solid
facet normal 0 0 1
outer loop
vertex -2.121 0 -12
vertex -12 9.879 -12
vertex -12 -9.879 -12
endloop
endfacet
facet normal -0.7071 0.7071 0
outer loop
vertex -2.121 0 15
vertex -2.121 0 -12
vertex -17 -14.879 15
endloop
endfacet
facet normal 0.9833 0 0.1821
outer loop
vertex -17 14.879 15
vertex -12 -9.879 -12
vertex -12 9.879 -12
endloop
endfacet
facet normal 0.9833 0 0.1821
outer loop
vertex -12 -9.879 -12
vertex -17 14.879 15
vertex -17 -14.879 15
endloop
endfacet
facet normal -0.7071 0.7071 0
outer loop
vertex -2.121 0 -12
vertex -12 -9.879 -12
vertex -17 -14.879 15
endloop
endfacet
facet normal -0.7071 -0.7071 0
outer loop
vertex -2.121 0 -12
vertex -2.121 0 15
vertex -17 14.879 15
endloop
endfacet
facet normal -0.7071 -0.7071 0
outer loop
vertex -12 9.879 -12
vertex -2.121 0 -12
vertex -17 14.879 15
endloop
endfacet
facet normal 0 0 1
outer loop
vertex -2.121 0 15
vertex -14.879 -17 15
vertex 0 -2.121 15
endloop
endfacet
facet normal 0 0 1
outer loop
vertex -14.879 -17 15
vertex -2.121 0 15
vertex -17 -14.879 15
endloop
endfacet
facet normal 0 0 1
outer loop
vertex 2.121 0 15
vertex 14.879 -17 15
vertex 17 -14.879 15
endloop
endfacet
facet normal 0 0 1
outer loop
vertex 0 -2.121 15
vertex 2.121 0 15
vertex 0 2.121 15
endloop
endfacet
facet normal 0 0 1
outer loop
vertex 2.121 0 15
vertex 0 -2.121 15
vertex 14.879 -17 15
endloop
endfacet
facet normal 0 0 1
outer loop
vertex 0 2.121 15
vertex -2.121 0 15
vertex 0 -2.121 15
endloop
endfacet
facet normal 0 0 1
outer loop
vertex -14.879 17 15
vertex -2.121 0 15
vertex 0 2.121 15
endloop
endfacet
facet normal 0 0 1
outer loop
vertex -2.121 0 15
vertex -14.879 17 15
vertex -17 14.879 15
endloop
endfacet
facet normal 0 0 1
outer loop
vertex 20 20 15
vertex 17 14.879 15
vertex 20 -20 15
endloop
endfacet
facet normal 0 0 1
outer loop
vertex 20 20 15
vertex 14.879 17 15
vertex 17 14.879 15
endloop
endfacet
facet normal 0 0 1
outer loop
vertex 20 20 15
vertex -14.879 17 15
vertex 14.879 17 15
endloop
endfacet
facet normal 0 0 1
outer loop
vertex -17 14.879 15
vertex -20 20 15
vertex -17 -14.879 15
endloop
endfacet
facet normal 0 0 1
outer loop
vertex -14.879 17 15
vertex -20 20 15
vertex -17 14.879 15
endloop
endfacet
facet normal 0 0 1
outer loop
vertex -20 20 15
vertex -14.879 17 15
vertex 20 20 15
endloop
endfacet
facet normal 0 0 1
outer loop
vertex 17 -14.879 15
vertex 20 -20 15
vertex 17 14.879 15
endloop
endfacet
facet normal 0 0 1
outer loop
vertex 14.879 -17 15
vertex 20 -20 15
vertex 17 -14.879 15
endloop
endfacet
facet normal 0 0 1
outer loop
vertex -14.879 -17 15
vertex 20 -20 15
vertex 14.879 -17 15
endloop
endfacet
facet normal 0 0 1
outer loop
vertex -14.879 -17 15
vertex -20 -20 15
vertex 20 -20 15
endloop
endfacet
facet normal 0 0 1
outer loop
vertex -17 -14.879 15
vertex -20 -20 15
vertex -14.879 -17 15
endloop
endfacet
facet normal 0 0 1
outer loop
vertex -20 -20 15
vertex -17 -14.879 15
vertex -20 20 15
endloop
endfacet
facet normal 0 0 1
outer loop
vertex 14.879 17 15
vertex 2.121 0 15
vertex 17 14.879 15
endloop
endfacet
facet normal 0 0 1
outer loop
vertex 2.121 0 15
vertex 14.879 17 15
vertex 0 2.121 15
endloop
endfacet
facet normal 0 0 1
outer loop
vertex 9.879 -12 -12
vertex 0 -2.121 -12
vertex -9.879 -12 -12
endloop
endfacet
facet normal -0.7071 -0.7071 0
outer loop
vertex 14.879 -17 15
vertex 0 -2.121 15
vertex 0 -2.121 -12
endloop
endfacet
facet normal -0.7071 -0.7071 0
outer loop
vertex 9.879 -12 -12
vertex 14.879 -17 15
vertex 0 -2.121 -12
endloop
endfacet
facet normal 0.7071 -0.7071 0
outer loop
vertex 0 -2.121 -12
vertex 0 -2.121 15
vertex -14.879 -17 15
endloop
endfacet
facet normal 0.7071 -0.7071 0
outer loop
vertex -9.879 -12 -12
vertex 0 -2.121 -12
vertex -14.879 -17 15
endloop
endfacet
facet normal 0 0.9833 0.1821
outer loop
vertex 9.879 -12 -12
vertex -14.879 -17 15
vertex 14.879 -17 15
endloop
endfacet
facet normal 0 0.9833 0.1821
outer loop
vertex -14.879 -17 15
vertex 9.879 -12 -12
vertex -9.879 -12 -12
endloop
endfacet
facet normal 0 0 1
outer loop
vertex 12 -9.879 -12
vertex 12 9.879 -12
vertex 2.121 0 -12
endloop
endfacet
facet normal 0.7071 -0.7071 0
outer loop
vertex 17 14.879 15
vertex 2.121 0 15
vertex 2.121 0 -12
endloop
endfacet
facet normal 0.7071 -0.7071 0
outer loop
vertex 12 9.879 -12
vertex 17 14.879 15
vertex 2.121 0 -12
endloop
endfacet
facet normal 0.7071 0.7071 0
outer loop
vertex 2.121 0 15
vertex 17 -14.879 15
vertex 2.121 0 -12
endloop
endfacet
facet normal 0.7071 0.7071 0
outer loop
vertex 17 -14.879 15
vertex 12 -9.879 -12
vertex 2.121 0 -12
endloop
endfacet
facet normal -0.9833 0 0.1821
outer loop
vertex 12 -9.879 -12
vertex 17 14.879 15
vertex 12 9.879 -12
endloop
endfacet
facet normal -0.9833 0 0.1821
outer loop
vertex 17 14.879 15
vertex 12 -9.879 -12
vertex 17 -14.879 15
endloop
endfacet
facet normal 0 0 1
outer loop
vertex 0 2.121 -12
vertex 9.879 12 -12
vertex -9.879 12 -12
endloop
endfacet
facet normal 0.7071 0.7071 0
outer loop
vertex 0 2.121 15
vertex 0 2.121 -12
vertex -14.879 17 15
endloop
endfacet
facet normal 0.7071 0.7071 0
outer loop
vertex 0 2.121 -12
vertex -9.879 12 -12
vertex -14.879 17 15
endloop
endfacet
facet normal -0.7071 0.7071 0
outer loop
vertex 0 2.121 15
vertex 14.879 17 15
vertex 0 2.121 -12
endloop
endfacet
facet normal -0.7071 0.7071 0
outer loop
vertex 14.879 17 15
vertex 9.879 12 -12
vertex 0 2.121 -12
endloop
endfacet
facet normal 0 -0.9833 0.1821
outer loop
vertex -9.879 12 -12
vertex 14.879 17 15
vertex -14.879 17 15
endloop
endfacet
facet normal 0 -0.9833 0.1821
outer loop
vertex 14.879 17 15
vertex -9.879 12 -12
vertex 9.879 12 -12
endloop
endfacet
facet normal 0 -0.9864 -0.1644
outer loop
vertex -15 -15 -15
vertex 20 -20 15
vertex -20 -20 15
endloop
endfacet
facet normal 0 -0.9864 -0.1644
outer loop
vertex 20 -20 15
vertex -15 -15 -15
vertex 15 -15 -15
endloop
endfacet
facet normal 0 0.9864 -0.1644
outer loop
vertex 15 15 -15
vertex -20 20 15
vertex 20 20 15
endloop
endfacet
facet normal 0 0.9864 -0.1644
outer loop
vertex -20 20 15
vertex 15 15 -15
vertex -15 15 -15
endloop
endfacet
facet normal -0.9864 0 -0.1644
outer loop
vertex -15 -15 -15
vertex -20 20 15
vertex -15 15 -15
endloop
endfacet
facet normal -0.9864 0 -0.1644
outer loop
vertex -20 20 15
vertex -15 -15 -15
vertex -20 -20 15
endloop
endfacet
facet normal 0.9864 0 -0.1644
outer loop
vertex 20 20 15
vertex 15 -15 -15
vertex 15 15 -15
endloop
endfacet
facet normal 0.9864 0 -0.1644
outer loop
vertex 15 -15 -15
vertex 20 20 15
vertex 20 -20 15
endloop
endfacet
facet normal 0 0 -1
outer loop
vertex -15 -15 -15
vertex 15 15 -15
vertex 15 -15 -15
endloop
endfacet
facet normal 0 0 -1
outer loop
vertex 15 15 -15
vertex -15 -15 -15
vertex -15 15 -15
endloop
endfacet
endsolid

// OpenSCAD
//heighth
heighth=30;
//width at bottom
length_bottom=15;
//width at top
length_top=20;
//wall strength
wall=3;

hh=heighth/2;
dia = wall * 0.5 * sqrt(2);

difference(){
m_hull();
ausschnitt();
}

module ausschnitt()
{
  for(i=[0:90:270]){
    rotate([0,0,i])polyhedron(points = [
        [-length_bottom+wall,-length_bottom+wall+dia, -hh+wall], [-length_bottom+wall,length_bottom-wall-dia, -hh+wall], [-dia, 0, -hh+wall],
        [-length_top+wall,-length_top+wall+dia, hh], [-length_top+wall,length_top-wall-dia, hh], [-dia,0, hh]],
    faces=[[0,2,1], [3,4,5],[0,1,3],[1,4,3], [1,2,4], [2,5,4], [2,0,3], [2,3,5] ]);
  }
}

module m_hull()
{

polyhedron(points = [ [-length_bottom,-length_bottom, -hh],[length_bottom,-length_bottom, -hh],[length_bottom,length_bottom, -hh],[-length_bottom,length_bottom, -hh],
           [-length_top,-length_top, hh],[length_top,-length_top, hh],[length_top,length_top, hh],[-length_top,length_top, hh]],
faces=[[1,2,0],[2,3,0],[4,6,5],[4,7,6],
[0,5,1],[0,4,5], [1,5,2],[2,5,6], [6,7,2],[2,7,3],
[0,3,7],[0,7,4]]);

}
